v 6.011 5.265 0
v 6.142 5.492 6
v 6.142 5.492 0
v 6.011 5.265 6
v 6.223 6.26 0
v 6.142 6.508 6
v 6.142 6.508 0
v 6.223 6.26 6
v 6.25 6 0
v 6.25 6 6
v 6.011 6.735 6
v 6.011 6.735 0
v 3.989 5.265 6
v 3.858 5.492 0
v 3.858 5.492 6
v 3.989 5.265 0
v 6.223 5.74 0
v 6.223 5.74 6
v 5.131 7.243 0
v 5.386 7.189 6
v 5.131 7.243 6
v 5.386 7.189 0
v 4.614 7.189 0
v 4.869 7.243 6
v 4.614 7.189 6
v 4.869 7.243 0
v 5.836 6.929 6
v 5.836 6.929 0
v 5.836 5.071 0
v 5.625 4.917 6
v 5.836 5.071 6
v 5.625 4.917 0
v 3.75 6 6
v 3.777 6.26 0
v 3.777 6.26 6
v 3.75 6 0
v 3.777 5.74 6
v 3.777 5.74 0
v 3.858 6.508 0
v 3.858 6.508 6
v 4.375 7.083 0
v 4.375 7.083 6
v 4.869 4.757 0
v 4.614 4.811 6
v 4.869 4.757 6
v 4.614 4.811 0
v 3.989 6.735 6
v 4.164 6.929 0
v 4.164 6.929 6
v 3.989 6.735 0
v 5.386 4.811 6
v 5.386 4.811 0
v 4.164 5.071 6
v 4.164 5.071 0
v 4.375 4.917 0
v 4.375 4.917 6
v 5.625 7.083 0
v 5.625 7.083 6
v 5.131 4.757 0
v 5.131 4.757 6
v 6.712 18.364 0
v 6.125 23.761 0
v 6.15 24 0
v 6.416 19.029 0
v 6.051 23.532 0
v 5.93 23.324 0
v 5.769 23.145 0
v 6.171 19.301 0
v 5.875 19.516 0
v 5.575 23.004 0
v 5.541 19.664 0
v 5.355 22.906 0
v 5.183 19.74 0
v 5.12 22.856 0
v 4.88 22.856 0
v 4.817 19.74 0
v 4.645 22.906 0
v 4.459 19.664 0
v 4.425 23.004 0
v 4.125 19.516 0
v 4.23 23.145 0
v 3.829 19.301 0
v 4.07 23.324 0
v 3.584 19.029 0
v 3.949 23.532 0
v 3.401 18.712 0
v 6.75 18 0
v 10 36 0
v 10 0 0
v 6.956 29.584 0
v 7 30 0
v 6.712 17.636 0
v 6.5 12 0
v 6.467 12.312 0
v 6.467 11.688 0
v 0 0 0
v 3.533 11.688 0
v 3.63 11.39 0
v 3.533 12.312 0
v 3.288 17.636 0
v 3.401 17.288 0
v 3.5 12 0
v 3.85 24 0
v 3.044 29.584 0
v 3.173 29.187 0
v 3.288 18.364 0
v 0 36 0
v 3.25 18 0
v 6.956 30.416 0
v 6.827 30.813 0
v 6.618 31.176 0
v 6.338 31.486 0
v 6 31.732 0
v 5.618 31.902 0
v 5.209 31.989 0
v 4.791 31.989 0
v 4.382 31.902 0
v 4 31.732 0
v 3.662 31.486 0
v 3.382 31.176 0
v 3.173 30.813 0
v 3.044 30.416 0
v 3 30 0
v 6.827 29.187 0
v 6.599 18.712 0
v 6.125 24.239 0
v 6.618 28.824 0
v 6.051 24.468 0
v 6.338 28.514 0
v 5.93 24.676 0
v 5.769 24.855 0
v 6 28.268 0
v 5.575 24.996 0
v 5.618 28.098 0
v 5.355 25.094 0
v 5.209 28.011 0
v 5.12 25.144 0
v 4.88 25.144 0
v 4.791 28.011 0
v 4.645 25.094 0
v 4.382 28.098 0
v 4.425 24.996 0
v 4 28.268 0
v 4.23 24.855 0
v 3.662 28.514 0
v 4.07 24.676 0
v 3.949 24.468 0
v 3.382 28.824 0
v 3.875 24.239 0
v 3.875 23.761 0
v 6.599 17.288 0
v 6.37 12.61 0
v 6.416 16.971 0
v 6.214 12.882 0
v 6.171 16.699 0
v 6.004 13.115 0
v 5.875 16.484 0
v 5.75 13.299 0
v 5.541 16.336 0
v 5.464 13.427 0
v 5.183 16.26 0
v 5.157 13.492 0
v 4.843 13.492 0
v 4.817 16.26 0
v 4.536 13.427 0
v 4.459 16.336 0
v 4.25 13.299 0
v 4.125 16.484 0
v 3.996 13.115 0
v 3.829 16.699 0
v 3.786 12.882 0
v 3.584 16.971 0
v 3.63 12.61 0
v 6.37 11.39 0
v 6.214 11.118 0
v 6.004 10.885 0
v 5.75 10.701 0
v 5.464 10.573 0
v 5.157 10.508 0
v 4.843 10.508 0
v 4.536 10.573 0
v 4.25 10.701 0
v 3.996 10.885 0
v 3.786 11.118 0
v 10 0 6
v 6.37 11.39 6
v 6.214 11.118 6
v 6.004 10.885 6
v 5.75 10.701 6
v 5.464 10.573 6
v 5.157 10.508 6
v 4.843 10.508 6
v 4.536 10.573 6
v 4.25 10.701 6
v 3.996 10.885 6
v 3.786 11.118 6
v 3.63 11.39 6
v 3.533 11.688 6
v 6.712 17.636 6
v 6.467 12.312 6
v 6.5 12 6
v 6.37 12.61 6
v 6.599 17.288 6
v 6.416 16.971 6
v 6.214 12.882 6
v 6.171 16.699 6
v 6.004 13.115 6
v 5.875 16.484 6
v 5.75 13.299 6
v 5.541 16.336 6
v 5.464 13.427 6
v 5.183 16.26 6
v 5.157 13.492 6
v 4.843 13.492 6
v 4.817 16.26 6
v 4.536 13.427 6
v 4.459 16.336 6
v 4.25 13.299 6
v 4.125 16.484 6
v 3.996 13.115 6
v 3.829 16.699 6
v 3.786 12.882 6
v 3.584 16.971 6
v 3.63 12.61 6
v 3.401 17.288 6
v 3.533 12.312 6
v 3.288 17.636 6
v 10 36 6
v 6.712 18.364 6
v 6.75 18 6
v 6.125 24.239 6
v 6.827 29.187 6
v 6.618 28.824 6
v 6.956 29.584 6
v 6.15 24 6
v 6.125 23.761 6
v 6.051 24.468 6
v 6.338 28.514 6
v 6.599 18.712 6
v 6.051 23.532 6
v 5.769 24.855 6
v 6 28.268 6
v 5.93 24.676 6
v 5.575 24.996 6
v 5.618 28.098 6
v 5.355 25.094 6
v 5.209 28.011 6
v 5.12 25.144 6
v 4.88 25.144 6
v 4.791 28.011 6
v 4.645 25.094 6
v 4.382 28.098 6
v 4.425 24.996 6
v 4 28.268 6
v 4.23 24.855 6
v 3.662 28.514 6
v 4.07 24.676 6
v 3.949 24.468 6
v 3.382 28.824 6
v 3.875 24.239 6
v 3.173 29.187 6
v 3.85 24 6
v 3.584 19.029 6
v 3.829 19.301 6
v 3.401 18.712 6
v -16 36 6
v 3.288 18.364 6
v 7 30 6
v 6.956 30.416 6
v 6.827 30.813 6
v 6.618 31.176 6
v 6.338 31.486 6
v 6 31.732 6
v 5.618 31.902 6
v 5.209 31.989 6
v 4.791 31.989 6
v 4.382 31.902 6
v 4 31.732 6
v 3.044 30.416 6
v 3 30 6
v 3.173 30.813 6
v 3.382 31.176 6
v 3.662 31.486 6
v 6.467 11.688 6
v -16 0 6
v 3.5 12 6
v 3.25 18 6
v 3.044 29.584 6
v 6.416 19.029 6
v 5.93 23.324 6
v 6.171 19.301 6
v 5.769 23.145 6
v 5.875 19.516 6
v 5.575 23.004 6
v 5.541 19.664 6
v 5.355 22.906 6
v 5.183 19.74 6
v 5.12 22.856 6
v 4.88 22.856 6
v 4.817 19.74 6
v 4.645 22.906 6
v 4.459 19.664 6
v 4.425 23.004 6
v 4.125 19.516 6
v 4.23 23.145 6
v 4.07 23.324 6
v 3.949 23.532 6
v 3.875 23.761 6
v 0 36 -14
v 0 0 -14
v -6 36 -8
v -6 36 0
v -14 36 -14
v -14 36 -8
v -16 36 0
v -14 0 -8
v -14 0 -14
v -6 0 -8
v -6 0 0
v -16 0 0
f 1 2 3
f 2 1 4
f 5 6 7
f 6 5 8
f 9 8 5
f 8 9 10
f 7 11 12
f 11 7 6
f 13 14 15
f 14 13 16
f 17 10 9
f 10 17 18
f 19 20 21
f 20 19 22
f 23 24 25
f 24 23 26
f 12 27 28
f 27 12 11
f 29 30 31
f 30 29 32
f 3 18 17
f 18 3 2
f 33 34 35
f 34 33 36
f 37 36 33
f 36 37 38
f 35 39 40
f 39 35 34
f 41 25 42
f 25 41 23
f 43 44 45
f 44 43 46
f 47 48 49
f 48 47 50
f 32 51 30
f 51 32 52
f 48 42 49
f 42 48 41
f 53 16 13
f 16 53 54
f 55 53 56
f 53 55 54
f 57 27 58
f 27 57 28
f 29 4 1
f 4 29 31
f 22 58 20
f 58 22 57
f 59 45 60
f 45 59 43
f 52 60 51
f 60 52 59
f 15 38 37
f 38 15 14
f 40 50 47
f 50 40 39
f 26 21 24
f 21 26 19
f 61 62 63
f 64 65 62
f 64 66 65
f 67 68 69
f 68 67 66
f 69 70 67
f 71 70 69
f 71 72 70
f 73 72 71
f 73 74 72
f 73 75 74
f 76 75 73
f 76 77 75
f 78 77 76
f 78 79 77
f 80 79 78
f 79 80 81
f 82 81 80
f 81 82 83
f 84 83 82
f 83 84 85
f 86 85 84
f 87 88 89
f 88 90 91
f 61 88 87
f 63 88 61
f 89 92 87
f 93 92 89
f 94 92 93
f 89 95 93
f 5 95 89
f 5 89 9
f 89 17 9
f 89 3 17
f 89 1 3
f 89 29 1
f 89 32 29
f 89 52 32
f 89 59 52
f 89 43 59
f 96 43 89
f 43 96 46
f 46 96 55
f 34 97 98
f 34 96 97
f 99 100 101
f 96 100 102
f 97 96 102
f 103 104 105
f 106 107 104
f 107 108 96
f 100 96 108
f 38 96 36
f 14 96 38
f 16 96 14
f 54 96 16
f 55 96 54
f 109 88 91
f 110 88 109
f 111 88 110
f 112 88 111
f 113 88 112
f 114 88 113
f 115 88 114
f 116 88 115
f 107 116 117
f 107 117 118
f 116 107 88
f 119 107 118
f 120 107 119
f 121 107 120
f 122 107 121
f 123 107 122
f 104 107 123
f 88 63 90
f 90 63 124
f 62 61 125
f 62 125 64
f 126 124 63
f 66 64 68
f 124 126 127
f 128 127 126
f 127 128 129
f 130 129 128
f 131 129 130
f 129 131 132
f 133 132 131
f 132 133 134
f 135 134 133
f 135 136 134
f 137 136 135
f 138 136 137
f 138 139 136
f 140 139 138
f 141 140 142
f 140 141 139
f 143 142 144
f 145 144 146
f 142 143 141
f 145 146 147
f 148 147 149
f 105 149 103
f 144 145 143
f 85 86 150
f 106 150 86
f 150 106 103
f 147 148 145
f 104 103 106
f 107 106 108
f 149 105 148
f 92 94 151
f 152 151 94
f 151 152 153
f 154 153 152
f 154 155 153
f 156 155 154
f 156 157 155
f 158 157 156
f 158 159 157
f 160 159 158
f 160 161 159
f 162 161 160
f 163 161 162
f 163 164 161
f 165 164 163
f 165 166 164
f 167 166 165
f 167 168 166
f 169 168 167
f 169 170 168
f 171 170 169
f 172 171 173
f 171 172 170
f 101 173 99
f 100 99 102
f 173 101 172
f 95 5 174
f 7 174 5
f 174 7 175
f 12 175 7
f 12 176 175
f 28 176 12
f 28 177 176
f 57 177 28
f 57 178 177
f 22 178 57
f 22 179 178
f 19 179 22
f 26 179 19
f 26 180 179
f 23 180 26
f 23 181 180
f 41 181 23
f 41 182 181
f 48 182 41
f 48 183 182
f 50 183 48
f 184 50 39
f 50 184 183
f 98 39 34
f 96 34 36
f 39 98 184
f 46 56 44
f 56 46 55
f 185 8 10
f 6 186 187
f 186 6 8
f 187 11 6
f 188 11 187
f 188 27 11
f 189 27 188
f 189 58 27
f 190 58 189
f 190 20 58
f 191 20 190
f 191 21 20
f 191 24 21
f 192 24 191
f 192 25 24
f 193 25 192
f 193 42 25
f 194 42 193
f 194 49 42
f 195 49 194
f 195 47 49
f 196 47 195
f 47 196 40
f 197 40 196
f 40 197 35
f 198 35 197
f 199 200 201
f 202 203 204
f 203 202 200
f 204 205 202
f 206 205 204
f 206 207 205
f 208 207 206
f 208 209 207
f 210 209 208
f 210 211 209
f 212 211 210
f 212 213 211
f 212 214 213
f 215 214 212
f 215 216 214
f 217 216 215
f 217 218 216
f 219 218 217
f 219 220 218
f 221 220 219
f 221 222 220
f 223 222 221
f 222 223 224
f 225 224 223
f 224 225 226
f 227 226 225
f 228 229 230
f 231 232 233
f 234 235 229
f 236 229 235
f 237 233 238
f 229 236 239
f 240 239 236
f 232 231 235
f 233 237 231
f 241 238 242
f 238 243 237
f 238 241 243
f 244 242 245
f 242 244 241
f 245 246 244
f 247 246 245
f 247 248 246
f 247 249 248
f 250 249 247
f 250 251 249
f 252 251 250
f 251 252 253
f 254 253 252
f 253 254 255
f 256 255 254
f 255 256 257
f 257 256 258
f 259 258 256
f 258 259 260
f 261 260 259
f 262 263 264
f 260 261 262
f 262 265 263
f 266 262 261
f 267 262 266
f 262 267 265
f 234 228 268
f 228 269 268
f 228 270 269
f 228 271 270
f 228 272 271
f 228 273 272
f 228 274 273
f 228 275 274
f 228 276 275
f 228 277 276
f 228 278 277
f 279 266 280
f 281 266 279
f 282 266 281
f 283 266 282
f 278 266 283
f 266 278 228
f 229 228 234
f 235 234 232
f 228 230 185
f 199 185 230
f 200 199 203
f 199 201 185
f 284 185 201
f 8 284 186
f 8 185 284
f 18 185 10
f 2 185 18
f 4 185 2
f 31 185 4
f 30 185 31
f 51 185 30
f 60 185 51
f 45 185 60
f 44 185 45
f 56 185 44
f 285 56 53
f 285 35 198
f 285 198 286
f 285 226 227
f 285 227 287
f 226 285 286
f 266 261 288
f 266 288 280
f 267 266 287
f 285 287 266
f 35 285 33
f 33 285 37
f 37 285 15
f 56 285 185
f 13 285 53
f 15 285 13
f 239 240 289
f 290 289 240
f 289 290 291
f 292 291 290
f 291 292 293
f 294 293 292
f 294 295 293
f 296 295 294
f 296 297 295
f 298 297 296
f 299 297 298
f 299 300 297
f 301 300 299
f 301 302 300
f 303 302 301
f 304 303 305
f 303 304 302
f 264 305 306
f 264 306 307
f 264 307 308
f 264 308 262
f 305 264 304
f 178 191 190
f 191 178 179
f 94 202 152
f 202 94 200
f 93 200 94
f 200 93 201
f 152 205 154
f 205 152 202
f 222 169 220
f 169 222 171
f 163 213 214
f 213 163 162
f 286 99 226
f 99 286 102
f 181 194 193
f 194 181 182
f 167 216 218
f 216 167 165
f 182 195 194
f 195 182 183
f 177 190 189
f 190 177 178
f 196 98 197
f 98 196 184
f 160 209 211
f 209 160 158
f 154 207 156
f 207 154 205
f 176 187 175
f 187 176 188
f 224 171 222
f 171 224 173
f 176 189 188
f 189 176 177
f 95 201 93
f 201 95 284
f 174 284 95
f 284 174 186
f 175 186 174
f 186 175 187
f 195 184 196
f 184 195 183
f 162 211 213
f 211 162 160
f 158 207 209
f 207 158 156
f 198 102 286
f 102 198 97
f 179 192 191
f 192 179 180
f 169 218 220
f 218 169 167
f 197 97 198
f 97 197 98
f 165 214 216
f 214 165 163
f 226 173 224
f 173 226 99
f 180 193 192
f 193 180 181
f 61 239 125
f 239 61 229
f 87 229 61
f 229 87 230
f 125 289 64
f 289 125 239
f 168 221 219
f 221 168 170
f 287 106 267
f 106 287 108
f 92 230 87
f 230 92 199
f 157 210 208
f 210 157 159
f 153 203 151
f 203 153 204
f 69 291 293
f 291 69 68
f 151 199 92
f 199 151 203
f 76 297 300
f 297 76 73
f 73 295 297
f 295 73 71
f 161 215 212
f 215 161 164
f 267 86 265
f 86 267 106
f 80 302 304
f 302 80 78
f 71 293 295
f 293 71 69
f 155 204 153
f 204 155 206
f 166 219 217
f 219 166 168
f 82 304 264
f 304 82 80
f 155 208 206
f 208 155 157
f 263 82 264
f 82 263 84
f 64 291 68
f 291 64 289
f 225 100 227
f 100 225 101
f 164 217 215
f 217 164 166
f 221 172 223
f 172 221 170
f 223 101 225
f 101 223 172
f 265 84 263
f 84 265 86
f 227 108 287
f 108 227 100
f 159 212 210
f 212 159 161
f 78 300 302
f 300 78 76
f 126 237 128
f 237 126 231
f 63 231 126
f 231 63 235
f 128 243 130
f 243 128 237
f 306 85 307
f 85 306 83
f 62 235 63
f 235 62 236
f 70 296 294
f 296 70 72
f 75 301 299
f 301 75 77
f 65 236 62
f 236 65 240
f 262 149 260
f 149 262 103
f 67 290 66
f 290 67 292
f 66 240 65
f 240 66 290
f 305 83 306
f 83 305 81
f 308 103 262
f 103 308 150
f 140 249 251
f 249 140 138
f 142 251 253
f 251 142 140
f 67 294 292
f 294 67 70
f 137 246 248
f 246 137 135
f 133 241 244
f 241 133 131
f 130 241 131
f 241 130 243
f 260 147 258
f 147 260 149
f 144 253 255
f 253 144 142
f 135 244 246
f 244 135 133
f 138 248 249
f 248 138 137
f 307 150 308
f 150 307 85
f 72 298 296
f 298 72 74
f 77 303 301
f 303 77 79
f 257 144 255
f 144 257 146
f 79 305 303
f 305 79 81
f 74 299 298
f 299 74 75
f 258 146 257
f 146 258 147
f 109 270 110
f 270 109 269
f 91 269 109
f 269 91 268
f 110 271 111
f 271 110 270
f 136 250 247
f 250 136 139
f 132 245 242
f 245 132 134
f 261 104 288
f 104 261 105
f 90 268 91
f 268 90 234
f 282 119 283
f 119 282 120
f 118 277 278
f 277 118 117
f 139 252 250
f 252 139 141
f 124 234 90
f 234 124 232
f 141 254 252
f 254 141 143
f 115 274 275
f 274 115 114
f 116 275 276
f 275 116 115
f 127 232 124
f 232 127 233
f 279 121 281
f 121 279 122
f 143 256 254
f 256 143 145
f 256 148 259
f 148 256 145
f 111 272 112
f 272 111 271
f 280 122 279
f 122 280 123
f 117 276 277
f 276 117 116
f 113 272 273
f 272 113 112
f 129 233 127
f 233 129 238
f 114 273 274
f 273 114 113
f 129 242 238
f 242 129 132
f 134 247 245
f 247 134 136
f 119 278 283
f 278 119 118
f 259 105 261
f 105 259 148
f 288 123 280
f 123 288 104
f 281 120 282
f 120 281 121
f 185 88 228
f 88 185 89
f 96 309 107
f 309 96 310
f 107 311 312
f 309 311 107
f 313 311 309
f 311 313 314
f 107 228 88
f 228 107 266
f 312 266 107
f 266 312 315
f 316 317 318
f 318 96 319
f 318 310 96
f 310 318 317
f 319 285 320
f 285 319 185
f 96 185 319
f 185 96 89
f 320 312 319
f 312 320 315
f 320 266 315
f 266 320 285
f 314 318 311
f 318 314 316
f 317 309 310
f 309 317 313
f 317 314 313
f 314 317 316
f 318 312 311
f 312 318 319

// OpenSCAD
d = [2.5,3,3.5,2.3,4]; 
thickness = 6;
thicknessBoard = 8;
overUp = 10;
overDown = 8;
attachment = "H";// H or V

dn = len(d);
dMax = max(d);

width = (dMax + 2) * 6; 
breit = dMax + 6;


difference(){
    cube([breit, width ,thickness]);
    
    for (i = [0 : dn - 1])
    {
        translate([breit/2, (width/(dn+1))* (i + 1) ,0])
            cylinder(d = d[i], h = thickness, $fn=30);
    }
}

if (attachment == "H") 
{
translate([-(overUp + thickness),0,0])
    cube([overUp + thickness, width ,thickness]);

translate([- (overDown + thickness),0,-(thickness+thicknessBoard)])
    cube([overDown + thickness, width ,thickness]);

translate([-(thickness),0,-(thicknessBoard)])
    cube([thickness, width ,thicknessBoard]);
}
if (attachment == "V") 
{
translate([-thickness,0,-overDown])
    cube([ thickness, width ,overDown + thickness]);

translate([-(2*thickness + thicknessBoard),0,-overUp])
    cube([ thickness, width ,overUp + thickness]);
translate([-(thickness + thicknessBoard),0,0])    
    cube([thicknessBoard, width ,thickness]);

}
